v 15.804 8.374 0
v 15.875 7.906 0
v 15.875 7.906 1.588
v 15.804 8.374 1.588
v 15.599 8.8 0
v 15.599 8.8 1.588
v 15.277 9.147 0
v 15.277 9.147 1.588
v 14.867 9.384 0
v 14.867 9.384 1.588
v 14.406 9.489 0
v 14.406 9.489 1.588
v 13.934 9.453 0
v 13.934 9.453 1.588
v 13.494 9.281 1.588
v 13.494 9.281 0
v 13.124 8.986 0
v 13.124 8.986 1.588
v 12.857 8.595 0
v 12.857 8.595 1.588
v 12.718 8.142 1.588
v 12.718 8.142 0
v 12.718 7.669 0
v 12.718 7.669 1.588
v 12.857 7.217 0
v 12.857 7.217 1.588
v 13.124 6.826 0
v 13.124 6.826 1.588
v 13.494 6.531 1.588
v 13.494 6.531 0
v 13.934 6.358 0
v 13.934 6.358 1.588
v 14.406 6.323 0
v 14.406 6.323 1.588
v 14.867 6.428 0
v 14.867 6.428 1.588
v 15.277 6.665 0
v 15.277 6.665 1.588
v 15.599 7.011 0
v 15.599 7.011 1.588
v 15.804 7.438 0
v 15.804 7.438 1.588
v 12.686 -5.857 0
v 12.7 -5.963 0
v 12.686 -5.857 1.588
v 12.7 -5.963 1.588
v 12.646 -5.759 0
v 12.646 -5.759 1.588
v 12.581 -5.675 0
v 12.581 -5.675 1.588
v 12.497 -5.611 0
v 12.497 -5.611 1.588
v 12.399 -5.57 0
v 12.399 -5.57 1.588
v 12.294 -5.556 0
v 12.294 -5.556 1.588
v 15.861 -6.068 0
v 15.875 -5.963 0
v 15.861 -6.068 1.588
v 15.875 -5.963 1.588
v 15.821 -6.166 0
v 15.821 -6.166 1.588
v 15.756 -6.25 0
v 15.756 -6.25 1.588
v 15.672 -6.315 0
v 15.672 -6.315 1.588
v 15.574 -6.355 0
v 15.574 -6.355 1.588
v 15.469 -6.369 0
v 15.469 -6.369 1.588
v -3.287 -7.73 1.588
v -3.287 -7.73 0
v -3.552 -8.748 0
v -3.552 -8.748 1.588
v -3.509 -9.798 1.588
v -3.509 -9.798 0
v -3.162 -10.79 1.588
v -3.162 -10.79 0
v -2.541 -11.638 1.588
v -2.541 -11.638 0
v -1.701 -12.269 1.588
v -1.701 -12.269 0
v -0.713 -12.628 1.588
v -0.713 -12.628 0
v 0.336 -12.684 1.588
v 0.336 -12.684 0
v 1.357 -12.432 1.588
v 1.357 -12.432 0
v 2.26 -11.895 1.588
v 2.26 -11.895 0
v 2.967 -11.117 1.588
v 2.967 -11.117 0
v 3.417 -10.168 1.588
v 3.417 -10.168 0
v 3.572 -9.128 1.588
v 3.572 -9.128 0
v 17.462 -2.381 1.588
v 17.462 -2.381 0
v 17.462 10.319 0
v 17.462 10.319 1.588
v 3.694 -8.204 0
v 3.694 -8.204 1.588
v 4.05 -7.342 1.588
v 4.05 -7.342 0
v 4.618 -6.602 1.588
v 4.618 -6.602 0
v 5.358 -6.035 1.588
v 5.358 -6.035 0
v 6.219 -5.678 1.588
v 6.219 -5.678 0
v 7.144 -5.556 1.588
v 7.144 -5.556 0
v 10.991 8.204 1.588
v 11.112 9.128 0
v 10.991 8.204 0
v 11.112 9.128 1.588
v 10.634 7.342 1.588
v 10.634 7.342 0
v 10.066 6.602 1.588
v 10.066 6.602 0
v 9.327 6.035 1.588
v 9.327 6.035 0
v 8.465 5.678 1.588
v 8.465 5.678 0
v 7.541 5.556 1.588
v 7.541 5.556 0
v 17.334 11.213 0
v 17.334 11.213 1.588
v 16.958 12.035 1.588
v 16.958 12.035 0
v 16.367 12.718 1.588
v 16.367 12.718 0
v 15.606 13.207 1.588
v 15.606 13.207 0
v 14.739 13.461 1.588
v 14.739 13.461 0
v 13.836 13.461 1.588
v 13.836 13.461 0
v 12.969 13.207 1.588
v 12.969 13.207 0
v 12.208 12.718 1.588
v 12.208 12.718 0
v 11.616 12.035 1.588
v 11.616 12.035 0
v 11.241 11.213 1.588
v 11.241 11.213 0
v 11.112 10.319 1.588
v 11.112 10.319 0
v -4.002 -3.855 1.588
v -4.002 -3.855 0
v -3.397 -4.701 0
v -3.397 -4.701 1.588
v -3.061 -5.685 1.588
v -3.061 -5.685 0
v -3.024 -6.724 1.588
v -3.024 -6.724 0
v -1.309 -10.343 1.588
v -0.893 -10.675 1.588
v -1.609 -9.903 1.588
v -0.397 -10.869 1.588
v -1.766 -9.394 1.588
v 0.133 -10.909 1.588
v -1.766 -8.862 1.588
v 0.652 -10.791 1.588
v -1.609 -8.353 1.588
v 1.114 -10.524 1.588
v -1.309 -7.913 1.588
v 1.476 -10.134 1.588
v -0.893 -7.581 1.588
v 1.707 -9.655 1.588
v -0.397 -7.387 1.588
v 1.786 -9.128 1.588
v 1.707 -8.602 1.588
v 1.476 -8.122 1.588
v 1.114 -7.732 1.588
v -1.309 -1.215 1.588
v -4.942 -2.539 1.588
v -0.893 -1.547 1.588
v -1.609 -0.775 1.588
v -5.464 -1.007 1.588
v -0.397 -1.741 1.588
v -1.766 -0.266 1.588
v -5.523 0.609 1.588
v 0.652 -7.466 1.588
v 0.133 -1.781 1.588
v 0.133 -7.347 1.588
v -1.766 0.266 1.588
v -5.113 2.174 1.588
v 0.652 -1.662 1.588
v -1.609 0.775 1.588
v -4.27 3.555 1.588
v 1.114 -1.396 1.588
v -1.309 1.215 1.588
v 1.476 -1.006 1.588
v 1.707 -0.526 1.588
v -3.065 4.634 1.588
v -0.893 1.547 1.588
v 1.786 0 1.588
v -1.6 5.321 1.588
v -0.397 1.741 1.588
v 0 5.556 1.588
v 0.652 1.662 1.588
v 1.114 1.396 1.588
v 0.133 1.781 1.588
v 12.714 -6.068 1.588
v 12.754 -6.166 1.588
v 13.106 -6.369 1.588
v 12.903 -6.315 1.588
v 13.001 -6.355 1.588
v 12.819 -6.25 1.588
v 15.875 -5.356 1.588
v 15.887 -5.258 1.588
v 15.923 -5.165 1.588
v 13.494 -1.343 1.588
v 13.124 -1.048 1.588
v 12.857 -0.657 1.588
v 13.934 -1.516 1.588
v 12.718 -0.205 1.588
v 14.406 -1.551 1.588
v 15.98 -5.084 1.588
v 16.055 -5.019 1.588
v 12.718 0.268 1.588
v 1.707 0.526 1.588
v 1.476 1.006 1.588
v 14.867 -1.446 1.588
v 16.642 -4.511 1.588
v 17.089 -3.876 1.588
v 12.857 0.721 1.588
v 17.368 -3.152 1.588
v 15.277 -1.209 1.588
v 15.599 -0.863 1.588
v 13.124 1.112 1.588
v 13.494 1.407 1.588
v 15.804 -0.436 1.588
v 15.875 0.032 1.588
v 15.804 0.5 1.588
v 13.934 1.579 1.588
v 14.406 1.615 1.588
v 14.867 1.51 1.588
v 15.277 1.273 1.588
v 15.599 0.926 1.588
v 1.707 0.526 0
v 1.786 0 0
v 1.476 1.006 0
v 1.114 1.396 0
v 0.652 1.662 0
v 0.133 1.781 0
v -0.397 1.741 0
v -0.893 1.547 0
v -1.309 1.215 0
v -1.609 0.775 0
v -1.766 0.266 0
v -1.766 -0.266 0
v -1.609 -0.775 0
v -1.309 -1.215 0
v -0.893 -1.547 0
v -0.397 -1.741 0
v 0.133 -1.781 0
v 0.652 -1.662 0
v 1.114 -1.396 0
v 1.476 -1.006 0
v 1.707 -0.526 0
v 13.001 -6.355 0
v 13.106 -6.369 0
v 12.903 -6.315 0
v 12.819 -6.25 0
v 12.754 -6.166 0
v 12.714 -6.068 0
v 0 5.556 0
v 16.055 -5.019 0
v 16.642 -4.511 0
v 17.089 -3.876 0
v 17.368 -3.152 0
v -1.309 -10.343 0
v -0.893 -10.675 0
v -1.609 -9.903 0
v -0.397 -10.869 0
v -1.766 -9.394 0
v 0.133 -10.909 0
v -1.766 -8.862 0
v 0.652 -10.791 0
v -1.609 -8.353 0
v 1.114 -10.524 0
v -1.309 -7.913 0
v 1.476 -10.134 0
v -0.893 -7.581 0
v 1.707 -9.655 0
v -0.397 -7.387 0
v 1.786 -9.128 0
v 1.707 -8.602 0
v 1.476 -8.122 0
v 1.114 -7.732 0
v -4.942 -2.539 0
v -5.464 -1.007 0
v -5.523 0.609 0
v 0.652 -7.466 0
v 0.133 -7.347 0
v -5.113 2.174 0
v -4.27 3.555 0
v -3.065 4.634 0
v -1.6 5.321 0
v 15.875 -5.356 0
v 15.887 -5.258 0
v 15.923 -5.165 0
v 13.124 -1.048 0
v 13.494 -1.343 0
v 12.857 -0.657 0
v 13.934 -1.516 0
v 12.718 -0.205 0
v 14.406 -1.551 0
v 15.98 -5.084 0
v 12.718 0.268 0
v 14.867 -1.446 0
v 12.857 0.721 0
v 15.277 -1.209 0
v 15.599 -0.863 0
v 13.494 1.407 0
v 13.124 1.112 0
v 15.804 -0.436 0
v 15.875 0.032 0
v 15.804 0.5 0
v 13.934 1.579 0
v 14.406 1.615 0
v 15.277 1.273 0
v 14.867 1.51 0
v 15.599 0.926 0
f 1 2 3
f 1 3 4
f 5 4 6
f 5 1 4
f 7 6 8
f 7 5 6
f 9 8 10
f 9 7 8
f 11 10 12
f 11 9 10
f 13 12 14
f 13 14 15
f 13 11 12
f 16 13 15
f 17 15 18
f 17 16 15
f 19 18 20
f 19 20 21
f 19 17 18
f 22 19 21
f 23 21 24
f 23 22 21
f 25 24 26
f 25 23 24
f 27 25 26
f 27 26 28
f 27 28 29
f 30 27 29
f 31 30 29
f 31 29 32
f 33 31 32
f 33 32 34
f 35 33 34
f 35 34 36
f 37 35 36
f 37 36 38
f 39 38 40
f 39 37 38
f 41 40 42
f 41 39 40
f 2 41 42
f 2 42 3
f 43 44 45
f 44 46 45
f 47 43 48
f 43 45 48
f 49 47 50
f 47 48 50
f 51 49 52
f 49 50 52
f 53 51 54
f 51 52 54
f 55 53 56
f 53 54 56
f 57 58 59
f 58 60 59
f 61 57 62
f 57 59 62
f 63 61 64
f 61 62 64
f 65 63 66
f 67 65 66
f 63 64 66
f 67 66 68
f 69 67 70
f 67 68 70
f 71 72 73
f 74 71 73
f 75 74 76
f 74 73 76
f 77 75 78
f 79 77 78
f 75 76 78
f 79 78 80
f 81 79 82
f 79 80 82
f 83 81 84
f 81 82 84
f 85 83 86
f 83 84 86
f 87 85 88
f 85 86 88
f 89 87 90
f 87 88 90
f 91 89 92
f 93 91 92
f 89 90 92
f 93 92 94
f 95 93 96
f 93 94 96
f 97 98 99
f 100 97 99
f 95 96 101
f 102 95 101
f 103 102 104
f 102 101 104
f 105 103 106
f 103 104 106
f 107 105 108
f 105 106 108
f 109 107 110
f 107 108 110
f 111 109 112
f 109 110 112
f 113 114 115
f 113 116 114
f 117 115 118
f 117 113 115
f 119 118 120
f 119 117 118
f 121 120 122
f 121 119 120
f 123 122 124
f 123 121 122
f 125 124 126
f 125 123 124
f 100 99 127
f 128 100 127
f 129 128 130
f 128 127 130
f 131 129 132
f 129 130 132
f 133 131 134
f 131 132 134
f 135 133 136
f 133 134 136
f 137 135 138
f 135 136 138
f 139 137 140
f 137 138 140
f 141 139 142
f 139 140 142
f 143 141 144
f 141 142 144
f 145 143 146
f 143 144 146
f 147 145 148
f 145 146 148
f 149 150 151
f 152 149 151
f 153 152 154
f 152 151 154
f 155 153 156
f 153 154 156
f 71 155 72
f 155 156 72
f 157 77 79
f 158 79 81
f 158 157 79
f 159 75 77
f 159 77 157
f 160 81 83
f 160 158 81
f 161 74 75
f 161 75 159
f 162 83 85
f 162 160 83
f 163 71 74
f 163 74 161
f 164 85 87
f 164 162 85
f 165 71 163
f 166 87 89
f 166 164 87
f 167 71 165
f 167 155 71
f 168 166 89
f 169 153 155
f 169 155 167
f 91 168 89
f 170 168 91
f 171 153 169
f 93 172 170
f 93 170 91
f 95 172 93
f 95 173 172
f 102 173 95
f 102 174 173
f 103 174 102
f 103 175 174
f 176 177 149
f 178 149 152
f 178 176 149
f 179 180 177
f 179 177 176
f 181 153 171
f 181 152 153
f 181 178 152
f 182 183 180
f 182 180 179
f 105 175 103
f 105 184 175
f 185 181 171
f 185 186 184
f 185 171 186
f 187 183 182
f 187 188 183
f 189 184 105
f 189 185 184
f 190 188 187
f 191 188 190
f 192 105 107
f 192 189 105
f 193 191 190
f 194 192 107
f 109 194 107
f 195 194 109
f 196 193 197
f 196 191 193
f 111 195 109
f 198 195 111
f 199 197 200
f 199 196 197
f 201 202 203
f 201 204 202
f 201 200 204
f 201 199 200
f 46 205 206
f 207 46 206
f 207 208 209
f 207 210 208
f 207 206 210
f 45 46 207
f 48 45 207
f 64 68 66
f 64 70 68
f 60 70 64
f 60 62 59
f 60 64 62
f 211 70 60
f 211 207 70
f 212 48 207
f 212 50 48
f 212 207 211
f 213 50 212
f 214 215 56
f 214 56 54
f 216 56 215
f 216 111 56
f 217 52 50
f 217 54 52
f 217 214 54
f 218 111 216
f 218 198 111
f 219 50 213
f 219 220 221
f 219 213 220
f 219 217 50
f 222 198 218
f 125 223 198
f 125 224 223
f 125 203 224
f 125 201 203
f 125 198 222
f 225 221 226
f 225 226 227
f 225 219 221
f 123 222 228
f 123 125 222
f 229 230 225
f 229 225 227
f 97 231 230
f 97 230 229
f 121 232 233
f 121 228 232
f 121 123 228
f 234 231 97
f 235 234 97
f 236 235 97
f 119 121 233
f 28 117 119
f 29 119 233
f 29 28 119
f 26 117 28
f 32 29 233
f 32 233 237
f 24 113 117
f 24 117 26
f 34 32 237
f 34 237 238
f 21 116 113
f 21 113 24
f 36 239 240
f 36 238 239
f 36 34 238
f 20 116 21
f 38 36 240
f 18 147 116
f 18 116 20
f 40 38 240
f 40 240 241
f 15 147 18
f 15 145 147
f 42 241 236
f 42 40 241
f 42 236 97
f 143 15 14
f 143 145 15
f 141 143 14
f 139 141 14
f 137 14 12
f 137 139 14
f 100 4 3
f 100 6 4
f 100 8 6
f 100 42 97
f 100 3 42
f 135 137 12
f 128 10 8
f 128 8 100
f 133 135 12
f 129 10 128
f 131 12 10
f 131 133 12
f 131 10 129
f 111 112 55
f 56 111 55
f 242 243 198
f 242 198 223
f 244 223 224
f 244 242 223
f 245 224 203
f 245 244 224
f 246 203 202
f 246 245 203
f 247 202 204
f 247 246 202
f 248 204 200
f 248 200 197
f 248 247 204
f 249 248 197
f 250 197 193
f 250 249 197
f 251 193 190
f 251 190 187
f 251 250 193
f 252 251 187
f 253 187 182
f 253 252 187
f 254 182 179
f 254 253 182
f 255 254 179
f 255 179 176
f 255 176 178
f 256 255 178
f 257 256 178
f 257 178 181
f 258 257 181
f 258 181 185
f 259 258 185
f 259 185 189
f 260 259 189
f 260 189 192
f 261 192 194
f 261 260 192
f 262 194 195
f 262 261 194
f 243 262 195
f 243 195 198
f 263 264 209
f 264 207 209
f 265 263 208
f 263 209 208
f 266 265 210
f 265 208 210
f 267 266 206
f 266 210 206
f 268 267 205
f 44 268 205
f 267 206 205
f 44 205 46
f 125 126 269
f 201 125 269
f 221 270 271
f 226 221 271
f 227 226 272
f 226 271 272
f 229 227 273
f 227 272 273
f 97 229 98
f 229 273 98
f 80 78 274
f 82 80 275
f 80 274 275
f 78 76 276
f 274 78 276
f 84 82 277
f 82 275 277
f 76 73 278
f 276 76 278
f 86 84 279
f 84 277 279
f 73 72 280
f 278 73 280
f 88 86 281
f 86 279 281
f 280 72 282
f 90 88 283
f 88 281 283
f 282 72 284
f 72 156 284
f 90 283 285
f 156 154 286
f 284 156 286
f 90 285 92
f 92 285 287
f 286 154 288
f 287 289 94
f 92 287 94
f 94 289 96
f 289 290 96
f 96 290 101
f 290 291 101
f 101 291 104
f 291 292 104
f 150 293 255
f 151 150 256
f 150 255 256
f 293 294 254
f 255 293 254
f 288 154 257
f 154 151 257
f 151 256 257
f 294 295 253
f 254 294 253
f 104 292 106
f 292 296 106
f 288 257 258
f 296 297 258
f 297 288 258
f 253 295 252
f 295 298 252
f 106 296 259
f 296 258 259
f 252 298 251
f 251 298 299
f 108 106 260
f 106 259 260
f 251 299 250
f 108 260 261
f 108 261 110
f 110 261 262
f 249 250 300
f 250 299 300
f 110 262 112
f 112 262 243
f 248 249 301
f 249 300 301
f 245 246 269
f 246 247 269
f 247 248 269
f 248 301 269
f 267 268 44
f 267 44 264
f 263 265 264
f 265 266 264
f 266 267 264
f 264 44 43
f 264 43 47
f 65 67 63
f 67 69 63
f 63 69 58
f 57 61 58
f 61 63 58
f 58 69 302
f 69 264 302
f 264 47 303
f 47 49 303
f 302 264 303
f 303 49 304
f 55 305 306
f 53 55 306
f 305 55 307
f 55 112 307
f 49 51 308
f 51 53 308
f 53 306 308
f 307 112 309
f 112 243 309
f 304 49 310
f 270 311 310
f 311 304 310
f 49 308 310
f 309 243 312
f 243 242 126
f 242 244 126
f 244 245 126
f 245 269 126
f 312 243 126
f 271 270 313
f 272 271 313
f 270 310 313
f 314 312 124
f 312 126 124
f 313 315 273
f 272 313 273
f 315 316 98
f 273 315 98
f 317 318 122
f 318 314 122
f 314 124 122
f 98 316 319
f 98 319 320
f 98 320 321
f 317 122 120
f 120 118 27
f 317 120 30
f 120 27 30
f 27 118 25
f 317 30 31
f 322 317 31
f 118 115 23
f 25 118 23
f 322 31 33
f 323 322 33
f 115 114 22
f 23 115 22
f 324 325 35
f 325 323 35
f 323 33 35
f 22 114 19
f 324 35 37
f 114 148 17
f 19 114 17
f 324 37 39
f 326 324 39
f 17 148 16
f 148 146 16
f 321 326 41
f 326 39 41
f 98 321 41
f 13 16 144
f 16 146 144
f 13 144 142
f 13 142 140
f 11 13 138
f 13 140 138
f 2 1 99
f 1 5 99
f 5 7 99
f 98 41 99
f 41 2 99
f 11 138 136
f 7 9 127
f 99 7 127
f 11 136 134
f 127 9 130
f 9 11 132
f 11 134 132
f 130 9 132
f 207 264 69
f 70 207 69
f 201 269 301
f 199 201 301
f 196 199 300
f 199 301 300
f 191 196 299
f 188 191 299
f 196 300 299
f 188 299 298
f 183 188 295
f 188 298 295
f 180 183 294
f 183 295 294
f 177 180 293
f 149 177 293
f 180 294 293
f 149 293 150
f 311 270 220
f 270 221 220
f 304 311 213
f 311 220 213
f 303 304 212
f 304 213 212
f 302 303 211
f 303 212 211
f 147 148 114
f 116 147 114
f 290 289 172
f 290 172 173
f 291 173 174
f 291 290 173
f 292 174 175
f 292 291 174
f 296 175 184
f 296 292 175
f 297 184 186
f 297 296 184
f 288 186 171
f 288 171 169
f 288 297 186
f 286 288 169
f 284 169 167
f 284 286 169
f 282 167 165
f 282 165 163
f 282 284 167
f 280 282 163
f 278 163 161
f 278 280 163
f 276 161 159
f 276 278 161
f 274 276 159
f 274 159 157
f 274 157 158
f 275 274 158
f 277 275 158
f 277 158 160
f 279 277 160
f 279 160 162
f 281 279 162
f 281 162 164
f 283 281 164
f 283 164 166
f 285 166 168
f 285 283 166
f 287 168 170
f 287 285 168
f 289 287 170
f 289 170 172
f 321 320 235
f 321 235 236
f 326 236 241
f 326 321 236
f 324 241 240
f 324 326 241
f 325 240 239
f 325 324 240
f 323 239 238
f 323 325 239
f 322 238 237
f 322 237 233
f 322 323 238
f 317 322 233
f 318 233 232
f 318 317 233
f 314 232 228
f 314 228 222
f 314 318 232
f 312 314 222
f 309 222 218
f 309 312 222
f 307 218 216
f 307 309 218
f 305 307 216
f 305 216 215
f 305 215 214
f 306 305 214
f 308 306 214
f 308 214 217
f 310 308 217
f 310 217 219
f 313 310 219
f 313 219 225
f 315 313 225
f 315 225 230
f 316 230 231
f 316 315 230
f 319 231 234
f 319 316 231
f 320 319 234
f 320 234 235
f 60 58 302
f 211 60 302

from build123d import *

# Parameters (mm, degrees)
SKETCH1_R           = 1.5875
SKETCH1_R_2         = 1.7859375
BOSS_EXTRUDE1_DEPTH = 1.5875
FILLET1_R           = 0.4064
FILLET2_R           = 3.571875


with BuildPart() as part:
    # Sketch1 → Boss-Extrude1 (new body)
    with BuildSketch(Plane.XY):
        with BuildLine():
            ThreePointArc((17.462464722, 10.31875), (14.287464722, 13.49375), (11.112464722, 10.31875))
            Line((11.112464722, 10.31875), (11.112464722, 5.55625))
            Line((11.112464722, 5.55625), (0, 5.55625))
            ThreePointArc((0, 5.55625), (-5.113201992, 2.17418478), (-4.001636336, -3.854714088))
            ThreePointArc((-4.001636336, -3.854714088), (-3.061446663, -5.6851033), (-3.287058398, -7.730434724))
            ThreePointArc((-3.287058398, -7.730434724), (-0.713207299, -12.628071623), (3.571875, -9.128125))
            ThreePointArc((3.571875, -9.128125), (4.61805296, -6.602427972), (7.143749984, -5.55625))
            Line((7.143749984, -5.55625), (12.699964722, -5.55625))
            Line((12.699964722, -5.55625), (12.699964722, -6.36905))
            Line((12.699964722, -6.36905), (15.874964722, -6.36905))
            Line((15.874964722, -6.36905), (15.874964722, -5.130880657))
            ThreePointArc((15.874964722, -5.130880657), (17.037095379, -3.96875), (17.462464722, -2.38125))
            Line((17.462464722, -2.38125), (17.462464722, 10.31875))
        make_face()
        with Locations((14.287464722, 0.03175)):
            Circle(SKETCH1_R, mode=Mode.SUBTRACT)
        with Locations((14.287464722, 7.90575)):
            Circle(SKETCH1_R, mode=Mode.SUBTRACT)
        Circle(SKETCH1_R_2, mode=Mode.SUBTRACT)
        with Locations((0, -9.128125)):
            Circle(SKETCH1_R_2, mode=Mode.SUBTRACT)
    extrude(amount=BOSS_EXTRUDE1_DEPTH)

    # Fillet1
    fillet1_edges = [part.edges().sort_by_distance(p)[0] for p in [
        (15.874964722, -5.130880657, 0.79375),
        (15.874964722, -6.36905, 0.79375),
        (12.699964722, -5.55625, 0.79375),
        (12.699964722, -6.36905, 0.79375),
    ]]
    fillet(fillet1_edges, radius=FILLET1_R - 0.0001)  # a hair under: the kernel refuses the full size

    # Fillet2
    fillet2_edges = [part.edges().sort_by_distance(p)[0] for p in [
        (11.112464722, 5.55625, 0.79375),
    ]]
    fillet(fillet2_edges, radius=FILLET2_R)


solid = part.part
